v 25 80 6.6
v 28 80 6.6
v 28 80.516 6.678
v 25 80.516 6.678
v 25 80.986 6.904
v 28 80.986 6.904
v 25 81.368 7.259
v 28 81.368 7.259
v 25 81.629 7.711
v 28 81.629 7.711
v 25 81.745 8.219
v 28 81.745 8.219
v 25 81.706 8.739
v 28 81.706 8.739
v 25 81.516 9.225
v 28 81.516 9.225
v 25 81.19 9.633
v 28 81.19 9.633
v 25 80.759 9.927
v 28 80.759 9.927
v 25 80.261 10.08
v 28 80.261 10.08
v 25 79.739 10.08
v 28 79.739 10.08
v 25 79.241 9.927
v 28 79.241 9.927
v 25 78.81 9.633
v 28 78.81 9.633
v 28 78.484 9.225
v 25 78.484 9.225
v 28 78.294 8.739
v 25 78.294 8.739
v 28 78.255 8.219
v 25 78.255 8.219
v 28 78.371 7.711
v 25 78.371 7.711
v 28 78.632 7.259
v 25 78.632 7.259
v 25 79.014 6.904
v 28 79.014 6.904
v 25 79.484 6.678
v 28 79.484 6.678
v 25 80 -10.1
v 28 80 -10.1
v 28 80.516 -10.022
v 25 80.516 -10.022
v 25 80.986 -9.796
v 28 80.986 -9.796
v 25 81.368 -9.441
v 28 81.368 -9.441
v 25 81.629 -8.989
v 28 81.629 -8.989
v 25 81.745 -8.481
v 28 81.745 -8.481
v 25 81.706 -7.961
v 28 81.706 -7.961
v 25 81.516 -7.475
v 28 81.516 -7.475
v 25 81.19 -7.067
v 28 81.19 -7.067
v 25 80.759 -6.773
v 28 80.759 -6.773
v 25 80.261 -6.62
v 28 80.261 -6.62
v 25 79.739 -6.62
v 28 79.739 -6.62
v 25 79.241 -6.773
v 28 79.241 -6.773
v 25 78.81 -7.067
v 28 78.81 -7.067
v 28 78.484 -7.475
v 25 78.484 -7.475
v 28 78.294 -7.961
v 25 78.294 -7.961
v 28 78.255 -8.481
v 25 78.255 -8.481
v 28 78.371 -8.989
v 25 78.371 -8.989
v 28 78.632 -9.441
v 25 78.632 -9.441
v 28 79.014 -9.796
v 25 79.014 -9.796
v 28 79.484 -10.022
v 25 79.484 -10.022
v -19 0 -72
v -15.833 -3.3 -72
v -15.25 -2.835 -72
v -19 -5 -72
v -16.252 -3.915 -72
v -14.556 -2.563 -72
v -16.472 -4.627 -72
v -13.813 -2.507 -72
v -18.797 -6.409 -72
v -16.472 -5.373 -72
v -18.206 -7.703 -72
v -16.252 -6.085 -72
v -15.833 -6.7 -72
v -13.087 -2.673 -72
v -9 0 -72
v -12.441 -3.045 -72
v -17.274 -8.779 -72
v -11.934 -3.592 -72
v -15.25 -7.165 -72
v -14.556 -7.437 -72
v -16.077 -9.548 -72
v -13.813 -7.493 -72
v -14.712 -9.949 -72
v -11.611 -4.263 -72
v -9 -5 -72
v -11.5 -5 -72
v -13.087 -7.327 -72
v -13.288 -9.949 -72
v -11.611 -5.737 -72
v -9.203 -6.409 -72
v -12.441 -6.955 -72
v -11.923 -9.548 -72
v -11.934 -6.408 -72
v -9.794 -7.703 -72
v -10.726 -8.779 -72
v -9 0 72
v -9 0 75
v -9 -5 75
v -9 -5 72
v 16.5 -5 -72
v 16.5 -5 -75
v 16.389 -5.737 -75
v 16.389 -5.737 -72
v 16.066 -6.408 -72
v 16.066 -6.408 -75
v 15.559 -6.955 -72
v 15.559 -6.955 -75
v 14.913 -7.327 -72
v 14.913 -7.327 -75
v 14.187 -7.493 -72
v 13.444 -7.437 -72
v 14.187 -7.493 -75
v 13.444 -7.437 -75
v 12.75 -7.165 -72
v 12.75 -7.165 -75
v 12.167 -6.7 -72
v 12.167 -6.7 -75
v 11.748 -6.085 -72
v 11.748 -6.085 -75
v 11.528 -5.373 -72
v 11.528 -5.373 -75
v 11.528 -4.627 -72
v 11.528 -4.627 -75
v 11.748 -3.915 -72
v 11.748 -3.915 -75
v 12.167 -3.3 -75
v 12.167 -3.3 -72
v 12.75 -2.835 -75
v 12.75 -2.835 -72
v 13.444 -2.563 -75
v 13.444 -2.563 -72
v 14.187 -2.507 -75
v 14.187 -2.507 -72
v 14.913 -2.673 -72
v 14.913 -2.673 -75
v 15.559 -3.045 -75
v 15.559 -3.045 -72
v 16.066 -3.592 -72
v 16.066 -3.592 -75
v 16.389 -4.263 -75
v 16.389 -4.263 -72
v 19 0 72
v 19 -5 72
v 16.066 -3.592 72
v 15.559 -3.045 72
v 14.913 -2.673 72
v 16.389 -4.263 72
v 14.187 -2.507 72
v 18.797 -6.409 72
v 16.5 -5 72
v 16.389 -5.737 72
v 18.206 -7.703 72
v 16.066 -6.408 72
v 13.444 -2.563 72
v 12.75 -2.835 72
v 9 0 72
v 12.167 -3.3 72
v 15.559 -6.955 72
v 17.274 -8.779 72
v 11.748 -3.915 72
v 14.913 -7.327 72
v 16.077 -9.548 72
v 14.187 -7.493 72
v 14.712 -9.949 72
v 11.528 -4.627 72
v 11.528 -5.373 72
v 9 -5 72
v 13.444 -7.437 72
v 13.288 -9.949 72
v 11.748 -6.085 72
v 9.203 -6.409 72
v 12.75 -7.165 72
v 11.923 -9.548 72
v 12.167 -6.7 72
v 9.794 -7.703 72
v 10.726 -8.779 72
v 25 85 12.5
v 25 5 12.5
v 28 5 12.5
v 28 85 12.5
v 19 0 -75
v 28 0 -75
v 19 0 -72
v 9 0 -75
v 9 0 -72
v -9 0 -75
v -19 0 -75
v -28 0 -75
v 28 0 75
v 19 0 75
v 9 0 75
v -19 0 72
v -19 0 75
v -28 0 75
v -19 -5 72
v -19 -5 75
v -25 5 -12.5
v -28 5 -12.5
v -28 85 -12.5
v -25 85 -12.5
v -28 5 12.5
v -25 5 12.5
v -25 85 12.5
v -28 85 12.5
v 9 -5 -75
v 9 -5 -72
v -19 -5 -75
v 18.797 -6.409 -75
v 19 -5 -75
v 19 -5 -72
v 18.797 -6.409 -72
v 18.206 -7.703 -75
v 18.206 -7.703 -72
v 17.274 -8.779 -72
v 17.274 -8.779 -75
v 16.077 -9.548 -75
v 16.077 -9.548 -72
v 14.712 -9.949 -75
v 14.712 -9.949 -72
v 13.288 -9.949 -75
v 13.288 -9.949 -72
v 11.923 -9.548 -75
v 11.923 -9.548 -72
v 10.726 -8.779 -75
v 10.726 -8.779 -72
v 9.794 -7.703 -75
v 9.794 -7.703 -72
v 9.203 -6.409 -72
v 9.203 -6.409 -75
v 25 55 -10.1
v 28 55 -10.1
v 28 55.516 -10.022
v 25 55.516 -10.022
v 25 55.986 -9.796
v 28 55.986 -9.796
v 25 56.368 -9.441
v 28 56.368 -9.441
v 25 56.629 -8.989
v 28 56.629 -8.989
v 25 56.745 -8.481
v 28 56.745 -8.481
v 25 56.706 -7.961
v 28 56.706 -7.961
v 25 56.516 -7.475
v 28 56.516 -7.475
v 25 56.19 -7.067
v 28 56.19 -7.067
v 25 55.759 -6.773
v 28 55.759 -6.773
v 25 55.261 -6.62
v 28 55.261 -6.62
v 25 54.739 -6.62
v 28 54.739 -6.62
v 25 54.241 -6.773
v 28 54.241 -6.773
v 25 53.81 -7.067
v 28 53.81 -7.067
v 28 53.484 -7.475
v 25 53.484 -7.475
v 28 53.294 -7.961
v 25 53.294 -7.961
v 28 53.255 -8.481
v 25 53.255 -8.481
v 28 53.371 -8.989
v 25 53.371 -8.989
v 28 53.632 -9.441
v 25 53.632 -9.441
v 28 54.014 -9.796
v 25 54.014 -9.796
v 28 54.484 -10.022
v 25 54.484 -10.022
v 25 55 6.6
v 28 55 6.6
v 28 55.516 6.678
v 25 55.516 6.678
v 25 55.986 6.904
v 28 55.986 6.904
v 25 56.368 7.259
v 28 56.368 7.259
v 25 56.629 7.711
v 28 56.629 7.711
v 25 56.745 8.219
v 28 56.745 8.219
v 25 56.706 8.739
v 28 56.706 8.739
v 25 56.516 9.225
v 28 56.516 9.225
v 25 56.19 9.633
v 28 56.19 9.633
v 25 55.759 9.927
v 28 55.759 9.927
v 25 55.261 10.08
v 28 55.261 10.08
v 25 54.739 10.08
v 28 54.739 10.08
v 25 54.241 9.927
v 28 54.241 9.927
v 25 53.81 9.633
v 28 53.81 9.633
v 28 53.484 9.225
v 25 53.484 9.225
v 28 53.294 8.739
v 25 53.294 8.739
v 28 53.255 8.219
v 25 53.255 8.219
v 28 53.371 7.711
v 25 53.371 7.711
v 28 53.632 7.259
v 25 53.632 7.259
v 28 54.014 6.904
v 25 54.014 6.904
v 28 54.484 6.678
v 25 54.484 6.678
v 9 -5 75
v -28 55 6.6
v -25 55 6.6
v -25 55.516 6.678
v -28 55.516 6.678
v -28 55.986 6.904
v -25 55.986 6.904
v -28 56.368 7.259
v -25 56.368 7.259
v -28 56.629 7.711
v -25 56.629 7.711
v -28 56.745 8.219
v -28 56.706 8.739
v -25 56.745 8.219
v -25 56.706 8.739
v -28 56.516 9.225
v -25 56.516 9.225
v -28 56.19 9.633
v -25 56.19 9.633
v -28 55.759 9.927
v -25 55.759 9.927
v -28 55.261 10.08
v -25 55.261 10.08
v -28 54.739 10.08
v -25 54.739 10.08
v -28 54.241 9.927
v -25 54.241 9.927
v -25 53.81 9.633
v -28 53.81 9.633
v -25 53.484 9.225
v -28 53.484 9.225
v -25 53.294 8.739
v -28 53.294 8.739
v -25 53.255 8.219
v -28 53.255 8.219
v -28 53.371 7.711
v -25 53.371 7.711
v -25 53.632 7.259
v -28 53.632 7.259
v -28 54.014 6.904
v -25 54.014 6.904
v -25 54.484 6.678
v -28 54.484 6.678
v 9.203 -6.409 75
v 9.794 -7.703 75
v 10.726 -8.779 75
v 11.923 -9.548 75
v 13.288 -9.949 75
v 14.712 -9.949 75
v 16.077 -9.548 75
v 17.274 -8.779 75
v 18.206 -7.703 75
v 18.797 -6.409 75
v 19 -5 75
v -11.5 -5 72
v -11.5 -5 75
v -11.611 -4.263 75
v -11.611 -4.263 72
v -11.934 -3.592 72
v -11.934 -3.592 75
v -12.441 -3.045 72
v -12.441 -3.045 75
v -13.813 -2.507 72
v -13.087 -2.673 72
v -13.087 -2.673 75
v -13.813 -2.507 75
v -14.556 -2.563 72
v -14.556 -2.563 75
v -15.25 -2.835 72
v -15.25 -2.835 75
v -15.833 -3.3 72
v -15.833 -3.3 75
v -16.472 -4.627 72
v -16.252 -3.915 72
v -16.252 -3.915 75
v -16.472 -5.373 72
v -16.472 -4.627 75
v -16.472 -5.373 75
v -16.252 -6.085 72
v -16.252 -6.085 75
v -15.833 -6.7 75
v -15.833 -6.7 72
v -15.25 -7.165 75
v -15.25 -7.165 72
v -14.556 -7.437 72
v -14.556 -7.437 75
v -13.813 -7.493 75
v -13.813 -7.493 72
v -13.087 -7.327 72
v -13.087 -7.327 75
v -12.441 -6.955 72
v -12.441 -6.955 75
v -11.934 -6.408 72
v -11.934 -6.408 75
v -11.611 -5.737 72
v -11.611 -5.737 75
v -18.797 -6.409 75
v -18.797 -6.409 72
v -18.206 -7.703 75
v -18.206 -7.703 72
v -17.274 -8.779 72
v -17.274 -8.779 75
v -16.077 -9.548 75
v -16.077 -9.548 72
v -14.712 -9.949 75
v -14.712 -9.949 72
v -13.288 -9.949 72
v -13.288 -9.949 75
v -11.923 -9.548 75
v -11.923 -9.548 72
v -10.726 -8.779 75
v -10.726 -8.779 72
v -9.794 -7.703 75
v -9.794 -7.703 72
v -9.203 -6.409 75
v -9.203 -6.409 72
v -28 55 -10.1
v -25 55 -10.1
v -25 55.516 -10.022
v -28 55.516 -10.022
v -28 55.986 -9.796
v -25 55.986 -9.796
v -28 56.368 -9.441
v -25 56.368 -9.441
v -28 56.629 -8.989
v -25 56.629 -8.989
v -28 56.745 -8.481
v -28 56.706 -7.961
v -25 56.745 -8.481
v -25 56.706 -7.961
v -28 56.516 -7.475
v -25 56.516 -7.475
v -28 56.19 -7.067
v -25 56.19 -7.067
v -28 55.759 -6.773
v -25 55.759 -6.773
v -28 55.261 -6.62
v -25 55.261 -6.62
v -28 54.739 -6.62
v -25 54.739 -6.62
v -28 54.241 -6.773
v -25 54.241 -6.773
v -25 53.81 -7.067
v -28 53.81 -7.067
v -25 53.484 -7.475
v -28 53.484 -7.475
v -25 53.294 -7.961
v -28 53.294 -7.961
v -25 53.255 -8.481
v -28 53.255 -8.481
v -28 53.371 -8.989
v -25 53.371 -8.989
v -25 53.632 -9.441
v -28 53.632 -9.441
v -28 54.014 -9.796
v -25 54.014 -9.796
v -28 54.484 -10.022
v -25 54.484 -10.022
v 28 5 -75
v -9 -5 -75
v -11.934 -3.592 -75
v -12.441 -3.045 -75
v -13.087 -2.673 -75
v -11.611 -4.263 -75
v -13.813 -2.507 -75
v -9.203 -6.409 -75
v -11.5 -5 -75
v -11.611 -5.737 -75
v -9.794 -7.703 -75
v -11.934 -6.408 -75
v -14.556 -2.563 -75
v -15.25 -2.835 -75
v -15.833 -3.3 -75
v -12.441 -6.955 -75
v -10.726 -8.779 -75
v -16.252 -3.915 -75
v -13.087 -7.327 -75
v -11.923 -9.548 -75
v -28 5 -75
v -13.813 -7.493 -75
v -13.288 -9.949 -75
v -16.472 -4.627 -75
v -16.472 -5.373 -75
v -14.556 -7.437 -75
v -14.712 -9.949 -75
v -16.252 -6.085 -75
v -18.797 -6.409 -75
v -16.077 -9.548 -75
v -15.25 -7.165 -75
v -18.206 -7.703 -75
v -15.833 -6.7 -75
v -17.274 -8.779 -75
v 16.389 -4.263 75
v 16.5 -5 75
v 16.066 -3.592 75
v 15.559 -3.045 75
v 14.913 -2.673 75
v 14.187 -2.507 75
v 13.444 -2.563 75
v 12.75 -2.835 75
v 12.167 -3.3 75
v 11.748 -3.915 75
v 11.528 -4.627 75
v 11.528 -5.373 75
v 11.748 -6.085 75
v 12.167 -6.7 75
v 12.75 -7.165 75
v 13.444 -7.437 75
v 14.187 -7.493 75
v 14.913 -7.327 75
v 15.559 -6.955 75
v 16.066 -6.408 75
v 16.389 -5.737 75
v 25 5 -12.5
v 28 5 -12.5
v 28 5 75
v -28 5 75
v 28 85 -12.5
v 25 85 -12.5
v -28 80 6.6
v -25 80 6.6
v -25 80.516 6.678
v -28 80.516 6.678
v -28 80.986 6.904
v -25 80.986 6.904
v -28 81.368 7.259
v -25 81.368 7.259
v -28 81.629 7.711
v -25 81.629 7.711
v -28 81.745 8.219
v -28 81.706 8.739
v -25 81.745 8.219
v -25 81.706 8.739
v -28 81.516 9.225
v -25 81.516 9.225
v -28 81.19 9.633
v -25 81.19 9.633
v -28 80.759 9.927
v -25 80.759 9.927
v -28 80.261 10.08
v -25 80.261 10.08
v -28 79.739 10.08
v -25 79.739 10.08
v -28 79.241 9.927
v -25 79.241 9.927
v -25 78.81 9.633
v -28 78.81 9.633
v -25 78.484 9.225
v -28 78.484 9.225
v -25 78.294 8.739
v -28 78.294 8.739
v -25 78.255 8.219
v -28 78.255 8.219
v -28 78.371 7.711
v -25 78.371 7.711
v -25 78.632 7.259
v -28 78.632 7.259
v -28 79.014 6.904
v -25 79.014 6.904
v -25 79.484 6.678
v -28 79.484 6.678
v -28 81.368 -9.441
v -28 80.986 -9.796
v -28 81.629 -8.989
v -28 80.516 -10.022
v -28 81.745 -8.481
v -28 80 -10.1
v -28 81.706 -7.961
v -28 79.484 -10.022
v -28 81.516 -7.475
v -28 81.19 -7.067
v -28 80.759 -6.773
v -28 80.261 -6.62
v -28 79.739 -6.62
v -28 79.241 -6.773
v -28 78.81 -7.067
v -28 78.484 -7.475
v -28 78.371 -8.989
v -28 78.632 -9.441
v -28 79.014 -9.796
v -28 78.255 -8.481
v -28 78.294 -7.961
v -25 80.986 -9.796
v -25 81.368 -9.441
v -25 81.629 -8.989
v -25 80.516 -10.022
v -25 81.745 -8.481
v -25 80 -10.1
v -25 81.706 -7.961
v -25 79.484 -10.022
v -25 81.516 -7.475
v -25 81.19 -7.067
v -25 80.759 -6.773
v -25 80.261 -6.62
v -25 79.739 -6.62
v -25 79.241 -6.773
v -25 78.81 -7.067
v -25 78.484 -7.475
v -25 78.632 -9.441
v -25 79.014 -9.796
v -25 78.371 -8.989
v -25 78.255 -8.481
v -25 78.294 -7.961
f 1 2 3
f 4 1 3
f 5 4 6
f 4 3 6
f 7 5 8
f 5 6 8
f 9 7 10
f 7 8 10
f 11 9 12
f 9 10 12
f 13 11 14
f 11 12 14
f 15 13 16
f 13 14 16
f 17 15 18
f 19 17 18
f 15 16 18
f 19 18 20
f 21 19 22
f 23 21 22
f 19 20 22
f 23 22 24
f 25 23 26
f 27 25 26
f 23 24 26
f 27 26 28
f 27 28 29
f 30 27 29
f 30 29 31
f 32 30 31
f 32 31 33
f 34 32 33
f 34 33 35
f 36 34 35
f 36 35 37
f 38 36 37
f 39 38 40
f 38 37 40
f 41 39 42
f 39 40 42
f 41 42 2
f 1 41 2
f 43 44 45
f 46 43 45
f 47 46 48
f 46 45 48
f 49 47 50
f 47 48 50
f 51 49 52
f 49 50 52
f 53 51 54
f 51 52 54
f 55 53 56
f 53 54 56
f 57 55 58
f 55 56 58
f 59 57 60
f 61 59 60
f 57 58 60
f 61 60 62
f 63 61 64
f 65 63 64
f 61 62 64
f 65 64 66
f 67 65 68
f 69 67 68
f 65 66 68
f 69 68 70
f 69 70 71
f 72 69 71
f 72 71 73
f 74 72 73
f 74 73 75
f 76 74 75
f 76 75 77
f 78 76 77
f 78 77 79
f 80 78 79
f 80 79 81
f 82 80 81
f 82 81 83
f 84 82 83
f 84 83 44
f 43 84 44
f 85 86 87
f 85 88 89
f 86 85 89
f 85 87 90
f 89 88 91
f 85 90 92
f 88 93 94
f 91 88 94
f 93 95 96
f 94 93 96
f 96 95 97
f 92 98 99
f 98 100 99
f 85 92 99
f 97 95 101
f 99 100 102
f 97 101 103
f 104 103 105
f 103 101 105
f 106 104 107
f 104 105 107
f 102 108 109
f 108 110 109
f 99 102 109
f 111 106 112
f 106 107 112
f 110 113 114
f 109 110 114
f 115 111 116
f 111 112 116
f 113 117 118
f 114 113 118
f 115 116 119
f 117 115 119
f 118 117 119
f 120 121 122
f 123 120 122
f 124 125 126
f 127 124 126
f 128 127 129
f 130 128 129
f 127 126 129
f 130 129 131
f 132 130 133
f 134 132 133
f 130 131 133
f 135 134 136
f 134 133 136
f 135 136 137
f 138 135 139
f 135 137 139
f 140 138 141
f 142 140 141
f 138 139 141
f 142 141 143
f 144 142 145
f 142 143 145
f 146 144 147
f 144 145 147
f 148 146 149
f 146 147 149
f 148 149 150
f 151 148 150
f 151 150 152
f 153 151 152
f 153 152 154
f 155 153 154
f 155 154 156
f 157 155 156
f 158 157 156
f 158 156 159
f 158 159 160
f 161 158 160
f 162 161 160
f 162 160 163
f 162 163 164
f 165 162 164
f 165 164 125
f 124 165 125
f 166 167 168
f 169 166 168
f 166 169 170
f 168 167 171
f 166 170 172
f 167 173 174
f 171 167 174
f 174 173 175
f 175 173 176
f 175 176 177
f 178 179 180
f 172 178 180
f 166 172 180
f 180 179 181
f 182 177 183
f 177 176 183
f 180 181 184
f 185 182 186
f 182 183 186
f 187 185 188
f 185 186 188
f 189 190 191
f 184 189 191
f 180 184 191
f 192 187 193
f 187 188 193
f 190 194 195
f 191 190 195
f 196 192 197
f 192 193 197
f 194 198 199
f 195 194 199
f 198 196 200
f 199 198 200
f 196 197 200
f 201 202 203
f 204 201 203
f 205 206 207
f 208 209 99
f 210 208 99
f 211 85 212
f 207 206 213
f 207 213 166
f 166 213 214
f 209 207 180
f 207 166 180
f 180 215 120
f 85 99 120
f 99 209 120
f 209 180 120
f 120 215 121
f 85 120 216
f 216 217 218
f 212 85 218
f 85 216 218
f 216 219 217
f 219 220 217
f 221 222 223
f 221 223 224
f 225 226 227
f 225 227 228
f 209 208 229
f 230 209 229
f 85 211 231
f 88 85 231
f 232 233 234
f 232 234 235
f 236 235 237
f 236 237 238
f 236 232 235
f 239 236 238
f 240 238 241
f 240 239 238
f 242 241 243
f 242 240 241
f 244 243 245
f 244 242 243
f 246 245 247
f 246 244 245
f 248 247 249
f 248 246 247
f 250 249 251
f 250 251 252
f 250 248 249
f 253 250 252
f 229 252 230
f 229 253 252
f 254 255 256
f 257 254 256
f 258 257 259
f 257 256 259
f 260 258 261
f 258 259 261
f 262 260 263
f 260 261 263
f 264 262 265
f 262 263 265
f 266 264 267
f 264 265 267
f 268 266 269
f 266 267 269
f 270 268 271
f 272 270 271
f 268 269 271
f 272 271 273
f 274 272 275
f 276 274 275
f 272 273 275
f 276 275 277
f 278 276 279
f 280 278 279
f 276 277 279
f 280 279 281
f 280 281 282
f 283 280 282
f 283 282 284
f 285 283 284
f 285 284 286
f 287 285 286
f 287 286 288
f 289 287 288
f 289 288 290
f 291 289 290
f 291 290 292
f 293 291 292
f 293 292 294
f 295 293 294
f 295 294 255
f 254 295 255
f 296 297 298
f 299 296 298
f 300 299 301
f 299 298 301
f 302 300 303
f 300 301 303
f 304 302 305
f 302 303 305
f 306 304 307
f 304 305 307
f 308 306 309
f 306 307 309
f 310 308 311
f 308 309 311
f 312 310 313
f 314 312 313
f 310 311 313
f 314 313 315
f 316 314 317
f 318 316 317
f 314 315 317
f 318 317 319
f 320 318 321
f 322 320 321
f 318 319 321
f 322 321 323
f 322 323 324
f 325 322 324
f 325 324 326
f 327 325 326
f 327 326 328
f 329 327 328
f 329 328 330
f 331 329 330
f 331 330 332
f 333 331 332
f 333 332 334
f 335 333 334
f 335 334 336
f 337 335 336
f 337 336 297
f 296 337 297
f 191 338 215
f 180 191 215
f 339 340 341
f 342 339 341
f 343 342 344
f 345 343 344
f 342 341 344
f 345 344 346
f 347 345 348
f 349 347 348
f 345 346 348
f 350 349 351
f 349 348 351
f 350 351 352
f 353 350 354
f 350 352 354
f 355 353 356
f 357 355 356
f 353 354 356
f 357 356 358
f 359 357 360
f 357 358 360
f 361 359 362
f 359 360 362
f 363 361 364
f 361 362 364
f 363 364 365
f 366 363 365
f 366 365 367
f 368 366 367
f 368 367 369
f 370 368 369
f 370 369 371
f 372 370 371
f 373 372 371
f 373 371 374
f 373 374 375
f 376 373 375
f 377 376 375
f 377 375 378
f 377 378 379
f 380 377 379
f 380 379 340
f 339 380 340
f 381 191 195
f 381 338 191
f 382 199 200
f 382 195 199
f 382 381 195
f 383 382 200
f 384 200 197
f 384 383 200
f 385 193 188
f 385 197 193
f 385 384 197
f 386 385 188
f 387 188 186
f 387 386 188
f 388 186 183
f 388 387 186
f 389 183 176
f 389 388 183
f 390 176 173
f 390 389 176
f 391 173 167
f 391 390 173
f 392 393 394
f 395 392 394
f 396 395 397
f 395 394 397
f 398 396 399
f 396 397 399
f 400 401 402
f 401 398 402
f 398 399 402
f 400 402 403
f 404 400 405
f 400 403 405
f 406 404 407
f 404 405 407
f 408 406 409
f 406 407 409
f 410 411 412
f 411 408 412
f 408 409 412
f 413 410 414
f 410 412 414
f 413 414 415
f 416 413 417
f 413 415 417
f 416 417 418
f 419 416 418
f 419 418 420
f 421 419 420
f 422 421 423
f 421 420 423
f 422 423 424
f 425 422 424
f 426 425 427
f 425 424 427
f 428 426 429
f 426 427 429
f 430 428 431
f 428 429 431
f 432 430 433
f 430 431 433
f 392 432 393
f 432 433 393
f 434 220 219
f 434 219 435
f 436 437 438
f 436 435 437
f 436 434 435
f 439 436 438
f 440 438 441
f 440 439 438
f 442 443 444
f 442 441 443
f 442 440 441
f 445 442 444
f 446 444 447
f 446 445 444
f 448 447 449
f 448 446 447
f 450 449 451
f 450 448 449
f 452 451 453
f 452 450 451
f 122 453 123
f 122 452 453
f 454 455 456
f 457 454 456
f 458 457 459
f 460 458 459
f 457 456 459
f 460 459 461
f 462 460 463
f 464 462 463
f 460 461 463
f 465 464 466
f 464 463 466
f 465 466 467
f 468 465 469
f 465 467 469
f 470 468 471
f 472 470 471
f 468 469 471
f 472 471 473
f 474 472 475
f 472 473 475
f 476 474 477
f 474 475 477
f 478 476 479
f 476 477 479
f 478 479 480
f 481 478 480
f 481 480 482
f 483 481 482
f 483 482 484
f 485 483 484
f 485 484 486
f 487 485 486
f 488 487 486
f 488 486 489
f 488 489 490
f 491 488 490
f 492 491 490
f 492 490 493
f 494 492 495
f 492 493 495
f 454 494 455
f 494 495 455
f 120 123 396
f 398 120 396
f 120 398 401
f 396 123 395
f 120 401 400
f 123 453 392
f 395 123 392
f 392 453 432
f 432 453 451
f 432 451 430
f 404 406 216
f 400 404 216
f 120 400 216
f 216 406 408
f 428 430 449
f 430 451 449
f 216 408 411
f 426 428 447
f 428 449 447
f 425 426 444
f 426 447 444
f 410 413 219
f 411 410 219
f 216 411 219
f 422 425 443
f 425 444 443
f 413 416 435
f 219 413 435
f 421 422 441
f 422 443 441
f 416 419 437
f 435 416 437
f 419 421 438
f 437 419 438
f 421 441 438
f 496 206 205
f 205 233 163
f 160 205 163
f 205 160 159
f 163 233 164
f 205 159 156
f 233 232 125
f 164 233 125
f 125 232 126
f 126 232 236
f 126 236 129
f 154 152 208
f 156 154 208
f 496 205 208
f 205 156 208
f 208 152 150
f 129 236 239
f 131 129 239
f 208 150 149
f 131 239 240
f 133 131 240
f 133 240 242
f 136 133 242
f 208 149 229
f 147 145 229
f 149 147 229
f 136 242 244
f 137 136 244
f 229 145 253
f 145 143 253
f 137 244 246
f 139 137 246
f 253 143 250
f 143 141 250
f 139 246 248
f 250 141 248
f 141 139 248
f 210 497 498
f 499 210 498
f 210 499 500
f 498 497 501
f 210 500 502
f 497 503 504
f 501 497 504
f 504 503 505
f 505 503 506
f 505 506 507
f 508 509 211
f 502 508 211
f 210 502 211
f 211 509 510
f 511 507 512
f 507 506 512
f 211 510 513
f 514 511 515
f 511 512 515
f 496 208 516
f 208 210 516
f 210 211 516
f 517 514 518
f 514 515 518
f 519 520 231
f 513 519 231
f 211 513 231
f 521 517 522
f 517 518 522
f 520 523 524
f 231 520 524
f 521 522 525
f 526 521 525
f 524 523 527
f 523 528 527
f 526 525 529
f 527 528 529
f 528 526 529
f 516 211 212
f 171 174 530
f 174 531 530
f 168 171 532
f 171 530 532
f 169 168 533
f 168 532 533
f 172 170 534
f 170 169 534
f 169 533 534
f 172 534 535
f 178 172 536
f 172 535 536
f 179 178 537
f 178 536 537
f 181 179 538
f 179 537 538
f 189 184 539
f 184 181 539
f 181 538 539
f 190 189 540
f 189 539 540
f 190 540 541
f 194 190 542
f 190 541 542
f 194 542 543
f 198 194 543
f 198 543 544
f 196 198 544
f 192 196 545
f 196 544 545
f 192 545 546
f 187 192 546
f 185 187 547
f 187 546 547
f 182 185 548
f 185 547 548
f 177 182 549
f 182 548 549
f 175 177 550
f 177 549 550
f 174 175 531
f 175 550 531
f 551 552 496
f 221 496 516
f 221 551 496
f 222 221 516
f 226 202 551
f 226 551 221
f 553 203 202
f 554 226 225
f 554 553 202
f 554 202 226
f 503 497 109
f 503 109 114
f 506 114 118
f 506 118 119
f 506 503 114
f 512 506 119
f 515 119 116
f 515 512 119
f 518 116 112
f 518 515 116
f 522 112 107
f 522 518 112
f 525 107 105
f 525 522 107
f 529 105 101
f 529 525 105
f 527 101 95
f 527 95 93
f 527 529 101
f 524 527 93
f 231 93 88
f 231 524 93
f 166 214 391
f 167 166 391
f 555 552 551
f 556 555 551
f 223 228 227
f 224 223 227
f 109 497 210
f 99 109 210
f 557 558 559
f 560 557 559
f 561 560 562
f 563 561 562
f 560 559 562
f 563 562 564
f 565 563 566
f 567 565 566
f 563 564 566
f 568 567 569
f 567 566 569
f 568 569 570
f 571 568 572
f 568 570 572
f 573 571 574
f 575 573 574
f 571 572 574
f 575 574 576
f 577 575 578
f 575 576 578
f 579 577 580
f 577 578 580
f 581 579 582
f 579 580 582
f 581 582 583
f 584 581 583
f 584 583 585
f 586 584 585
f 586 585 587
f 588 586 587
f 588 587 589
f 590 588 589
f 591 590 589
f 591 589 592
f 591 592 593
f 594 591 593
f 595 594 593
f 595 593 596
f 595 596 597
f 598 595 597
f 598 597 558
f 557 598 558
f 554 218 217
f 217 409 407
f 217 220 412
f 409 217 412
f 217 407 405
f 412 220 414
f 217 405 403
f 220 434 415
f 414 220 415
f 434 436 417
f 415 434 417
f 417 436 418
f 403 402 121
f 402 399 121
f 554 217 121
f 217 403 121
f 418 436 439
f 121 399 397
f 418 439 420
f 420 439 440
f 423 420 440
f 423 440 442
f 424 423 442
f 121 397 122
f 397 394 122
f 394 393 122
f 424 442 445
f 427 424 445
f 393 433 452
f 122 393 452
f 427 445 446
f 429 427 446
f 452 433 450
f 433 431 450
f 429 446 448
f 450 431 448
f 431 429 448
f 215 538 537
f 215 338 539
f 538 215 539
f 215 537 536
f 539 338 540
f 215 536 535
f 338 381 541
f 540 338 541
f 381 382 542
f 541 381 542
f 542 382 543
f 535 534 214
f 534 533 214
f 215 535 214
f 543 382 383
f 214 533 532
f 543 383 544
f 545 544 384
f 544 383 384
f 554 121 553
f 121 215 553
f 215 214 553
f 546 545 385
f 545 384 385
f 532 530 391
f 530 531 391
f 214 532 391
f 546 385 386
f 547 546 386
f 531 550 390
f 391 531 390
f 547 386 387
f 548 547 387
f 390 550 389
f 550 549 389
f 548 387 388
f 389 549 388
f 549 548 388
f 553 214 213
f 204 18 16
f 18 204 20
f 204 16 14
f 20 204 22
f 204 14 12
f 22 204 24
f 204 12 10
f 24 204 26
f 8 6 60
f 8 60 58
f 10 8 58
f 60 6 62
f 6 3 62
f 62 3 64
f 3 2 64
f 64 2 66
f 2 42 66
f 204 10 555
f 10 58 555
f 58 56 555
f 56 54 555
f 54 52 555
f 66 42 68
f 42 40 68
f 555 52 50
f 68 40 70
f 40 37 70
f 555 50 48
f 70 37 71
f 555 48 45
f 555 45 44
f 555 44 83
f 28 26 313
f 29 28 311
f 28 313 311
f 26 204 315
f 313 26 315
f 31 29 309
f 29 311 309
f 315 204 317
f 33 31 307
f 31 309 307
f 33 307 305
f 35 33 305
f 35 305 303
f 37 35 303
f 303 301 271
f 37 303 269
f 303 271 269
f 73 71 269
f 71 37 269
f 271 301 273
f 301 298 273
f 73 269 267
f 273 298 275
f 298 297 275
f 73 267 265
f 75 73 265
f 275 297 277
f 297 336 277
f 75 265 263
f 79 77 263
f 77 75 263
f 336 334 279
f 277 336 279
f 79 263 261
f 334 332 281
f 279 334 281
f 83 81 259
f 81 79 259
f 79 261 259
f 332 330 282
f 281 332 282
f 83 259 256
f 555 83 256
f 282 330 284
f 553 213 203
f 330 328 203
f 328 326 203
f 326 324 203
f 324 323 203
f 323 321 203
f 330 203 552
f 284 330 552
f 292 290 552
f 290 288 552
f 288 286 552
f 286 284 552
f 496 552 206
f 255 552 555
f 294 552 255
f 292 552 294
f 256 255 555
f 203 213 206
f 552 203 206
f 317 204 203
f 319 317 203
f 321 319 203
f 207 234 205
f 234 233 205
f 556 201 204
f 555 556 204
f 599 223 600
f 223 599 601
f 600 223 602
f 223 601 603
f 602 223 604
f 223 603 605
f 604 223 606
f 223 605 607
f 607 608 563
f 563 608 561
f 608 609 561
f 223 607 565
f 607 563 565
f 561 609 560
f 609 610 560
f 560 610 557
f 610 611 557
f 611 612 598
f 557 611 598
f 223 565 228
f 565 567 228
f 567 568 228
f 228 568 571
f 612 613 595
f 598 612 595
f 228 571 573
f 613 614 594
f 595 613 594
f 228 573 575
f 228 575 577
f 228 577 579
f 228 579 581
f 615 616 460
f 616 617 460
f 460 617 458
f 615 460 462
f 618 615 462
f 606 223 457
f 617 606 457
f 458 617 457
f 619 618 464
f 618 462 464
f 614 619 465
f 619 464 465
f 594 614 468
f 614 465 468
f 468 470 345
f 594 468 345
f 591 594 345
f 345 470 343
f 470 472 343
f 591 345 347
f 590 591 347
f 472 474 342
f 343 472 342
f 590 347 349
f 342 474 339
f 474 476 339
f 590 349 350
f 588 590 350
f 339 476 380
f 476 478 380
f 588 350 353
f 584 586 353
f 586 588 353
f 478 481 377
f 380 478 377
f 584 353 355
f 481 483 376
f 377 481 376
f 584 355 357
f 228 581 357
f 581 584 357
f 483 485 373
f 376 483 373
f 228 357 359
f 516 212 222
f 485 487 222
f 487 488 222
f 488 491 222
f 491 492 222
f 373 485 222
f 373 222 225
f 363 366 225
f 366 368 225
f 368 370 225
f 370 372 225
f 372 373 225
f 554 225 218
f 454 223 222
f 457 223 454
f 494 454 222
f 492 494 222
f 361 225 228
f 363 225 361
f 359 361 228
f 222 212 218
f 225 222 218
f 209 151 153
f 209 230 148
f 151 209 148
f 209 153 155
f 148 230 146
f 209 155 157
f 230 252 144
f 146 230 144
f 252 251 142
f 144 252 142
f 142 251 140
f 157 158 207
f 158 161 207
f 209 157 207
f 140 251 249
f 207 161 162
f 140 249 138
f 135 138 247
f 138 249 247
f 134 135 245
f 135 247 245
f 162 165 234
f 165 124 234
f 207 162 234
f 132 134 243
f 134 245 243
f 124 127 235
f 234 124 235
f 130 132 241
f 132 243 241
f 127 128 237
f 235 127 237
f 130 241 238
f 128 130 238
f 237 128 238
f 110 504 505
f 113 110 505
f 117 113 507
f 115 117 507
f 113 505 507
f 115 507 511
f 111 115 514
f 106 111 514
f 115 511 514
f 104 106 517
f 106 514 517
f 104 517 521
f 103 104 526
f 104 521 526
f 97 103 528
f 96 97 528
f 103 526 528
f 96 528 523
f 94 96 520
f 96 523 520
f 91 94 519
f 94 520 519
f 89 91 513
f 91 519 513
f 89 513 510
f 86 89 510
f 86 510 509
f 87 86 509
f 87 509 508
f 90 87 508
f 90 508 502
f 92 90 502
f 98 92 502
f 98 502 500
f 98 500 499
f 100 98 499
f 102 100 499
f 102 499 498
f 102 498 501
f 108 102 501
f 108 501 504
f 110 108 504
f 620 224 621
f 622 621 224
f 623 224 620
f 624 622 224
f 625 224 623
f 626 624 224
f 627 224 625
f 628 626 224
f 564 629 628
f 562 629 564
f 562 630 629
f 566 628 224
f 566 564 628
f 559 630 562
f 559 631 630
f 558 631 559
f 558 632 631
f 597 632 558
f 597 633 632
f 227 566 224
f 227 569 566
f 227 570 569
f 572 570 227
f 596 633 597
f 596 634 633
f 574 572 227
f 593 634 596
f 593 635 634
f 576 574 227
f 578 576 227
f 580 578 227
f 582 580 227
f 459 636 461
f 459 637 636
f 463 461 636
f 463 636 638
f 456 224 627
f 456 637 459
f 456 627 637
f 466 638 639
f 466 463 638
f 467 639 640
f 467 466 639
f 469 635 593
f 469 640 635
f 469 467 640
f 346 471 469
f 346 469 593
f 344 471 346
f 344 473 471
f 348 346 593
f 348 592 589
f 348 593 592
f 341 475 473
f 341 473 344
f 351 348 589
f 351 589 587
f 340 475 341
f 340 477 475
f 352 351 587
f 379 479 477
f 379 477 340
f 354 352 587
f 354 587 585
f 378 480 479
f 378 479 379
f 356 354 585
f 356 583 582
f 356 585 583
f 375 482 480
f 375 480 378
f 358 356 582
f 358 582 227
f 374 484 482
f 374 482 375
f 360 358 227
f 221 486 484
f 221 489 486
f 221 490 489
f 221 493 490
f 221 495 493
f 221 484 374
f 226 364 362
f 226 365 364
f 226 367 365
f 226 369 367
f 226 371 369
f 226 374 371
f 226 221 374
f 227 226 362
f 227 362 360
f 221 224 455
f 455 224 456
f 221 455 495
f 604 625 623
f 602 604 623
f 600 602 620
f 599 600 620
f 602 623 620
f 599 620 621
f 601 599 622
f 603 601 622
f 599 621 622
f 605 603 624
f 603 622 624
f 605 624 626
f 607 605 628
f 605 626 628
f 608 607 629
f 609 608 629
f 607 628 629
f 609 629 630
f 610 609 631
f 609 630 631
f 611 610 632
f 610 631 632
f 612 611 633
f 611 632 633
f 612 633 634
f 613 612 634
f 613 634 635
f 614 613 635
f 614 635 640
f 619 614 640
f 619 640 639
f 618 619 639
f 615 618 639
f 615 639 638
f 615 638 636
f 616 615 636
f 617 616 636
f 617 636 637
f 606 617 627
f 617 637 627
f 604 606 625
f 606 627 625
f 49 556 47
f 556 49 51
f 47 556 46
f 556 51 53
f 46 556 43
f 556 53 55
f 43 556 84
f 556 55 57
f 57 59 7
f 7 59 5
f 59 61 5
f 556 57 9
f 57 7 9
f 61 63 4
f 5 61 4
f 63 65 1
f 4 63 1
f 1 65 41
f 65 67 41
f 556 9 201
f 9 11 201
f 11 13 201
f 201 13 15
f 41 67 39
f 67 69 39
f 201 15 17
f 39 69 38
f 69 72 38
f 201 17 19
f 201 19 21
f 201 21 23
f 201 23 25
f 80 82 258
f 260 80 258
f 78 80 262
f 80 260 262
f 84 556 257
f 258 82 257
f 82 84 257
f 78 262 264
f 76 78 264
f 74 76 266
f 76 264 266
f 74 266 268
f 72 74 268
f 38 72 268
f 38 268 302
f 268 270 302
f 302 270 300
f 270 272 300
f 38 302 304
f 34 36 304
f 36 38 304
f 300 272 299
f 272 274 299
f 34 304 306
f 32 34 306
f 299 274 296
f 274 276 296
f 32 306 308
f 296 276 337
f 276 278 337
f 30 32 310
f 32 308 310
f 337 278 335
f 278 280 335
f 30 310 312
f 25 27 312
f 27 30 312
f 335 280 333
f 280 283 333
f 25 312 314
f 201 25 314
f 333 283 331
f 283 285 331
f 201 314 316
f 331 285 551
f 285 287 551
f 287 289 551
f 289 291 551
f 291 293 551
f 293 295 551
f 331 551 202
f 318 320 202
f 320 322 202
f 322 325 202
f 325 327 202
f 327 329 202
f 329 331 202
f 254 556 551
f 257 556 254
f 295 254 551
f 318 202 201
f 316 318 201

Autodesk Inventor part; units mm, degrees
ref_plane "YZ Plane" through (0, 0, 0) normal (1, 0, 0) x (0, 1, 0)
ref_plane "XZ Plane" through (0, 0, 0) normal (0, 1, 0) x (-1, 0, 0)
sketch "Sketch1" plane through (0, 0, 0) normal (0, 1, 0) x (-1, 0, 0)
  line L0 (28, 75) -> (-28, 75)
  line L1 (-28, 75) -> (-28, -75)
  line L2 (-28, -75) -> (28, -75)
  line L3 (28, -75) -> (28, 75)
  line L4 (28, 75) -> (-28, -75) construction
  line L5 (-28, 75) -> (28, -75) construction
  point P0 (0, 0)
  dimension "d0" = 56
  dimension "d1" = 150
extrude "Extrusion1" add sketch "Sketch1" along normal blind 5
sketch "Sketch2" plane through (0, 5, 0) normal (0, 1, 0) x (1, 0, 0)
  line L0 (-28, 12.5) -> (-25, 12.5)
  line L1 (-25, 12.5) -> (-25, -12.5)
  line L2 (-25, -12.5) -> (-28, -12.5)
  line L3 (-28, -12.5) -> (-28, 12.5)
  line L4 (-28, 75) -> (-28, -75) projected
  line L5 (0, 0) -> (0, 30.0888)
  line L6 (28, 12.5) -> (25, 12.5)
  line L7 (25, 12.5) -> (25, -12.5)
  line L8 (25, -12.5) -> (28, -12.5)
  line L9 (28, -12.5) -> (28, 12.5)
  point P0 (-28, 0)
  dimension "d4" = 3
  dimension "d5" = 25
extrude "Extrusion2" add sketch "Sketch2" along normal blind 80
sketch "Sketch3" plane through (28, 0, 75) normal (1, 0, 0) x (0, 0, -1)
  circle A0 centre (66.65, 55) radius 1.75
  circle A1 centre (66.65, 80) radius 1.75
  circle A2 centre (83.35, 80) radius 1.75
  circle A3 centre (83.35, 55) radius 1.75
  circle A4 centre (66.65, 55) radius 1.75
  circle A5 centre (66.65, 80) radius 1.75
  circle A6 centre (83.35, 80) radius 1.75
  circle A7 centre (83.35, 55) radius 1.75
  line L0 (83.35, 55) -> (66.65, 80)
  line L1 (66.65, 80) -> (66.65, 55)
  line L2 (66.65, 55) -> (83.35, 80)
  line L3 (83.35, 80) -> (83.35, 55)
  line L4 (66.65, 55) -> (83.35, 55)
  line L5 (83.35, 80) -> (66.65, 80)
  line L6 (0, 0) -> (150, 0) projected
  line L7 (150, 0) -> (150, 5) projected
  line L8 (87.5, 5) -> (150, 5) projected
  line L9 (87.5, 5) -> (87.5, 85) projected
  line L10 (62.5, 85) -> (87.5, 85) projected
  line L11 (62.5, 5) -> (62.5, 85) projected
  line L12 (0, 5) -> (62.5, 5) projected
  line L13 (0, 0) -> (0, 5) projected
  line L14 (62.5, 80) -> (87.5, 80)
  line L15 (87.5, 5) -> (87.5, 85) projected
  point P0 (75, 0)
  point P1 (75, 80)
  dimension "d12" = 5
  dimension "d14" = 16.7
  dimension "d15" = 25
extrude "Extrusion3" cut sketch "Sketch3" against normal through all contours L4 L2 A0 | A0 L1 L4 | L2 L1 A0 | L4 L3 A3 | A3 L0 L4 | L1 L0 A1 | A1 L14 L1 | A3 L3 L0 | L0 L5 A1 | L2 L3 A2 | A2 L5 L2 | A1 L5 L14 | A2 L14 L5 | L3 L14 A2
sketch "Sketch4" plane through (-28, 0, 75) normal (0, 0, 1) x (1, 0, 0)
  circle A0 centre (14, 10) radius 2.5
  circle A1 centre (42, 10) radius 2.5
  line L0 (6.5, 5) -> (9, 5)
  line L1 (47, 5) -> (49.5, 5)
  line L2 (47, 10) -> (47, 5)
  arc A2 (47, 10) -> (37, 10) centre (42, 10) ccw
  line L3 (37, 5) -> (37, 10)
  line L4 (19, 5) -> (37, 5)
  line L5 (19, 10) -> (19, 5)
  arc A3 (19, 10) -> (9, 10) centre (14, 10) ccw
  line L6 (9, 5) -> (9, 10)
  line L7 (0, 5) -> (56, 5) projected
  point P0 (28, 0)
  point P1 (33.2021, 4.5034)
  point P2 (28, 5)
  point P3 (9, 5)
  dimension "d18" = 43
  dimension "d19" = 18
  dimension "d20" = 5
  dimension "d21" = 5
  dimension "d22" = 5
  dimension "d23" = 5
  dimension "d24" = 5
  dimension "d25" = 5
extrude "Extrusion4" add sketch "Sketch4" against normal blind 3
ref_plane "Work Plane1" through (0, 2.5, 0) normal (0, -1, 0) x (1, 0, 0)
mirror "Mirror1" about plane through (0, 2.5, 0) normal (0, -1, 0) of "Extrusion4"
mirror "Mirror2" about plane through (0, 0, 0) normal (0, 0, 1) of "Extrusion4", "Mirror1"
sketch "Sketch5" plane through (28, 0, 75) normal (0, 0, 1) x (1, 0, 0)
  line L0 (-47, 5) -> (-56, 5) projected
  line L1 (0, 5) -> (-9, 5) projected
  line L2 (-47, 5) -> (-9, 5)
  circle A0 centre (-14, -5) radius 2.5 projected
  circle A1 centre (-42, -5) radius 2.5 projected
  circle A2 centre (-14, 10) radius 2.5 projected
  circle A3 centre (-42, 10) radius 2.5 projected
  line L3 (-56, 0) -> (-47, 0) projected
  line L4 (-47, -5) -> (-47, 0) projected
  arc A4 (-47, -5) -> (-37, -5) centre (-42, -5) ccw projected
  line L5 (-37, 0) -> (-37, -5) projected
  line L6 (-37, 0) -> (-19, 0) projected
  line L7 (-19, -5) -> (-19, 0) projected
  arc A5 (-19, -5) -> (-9, -5) centre (-14, -5) ccw projected
  line L8 (-9, 0) -> (-9, -5) projected
  line L9 (-9, 0) -> (0, 0) projected
  line L10 (0, 0) -> (0, 5) projected
  line L11 (-9, 5) -> (0, 5) projected
  line L12 (-9, 5) -> (-9, 10) projected
  arc A6 (-9, 10) -> (-19, 10) centre (-14, 10) ccw projected
  line L13 (-19, 10) -> (-19, 5) projected
  line L14 (-37, 5) -> (-19, 5) projected
  line L15 (-37, 5) -> (-37, 10) projected
  arc A7 (-37, 10) -> (-47, 10) centre (-42, 10) ccw projected
  line L16 (-47, 10) -> (-47, 5) projected
  line L17 (-56, 5) -> (-47, 5) projected
  line L18 (-56, 0) -> (-56, 5) projected
  point P0 (-28, 0)
extrude "Extrusion5" cut sketch "Sketch5" against normal through all contours L16 A7 L15 L2 | L13 A6 L12 L2
properties part number "Mounting atas"
